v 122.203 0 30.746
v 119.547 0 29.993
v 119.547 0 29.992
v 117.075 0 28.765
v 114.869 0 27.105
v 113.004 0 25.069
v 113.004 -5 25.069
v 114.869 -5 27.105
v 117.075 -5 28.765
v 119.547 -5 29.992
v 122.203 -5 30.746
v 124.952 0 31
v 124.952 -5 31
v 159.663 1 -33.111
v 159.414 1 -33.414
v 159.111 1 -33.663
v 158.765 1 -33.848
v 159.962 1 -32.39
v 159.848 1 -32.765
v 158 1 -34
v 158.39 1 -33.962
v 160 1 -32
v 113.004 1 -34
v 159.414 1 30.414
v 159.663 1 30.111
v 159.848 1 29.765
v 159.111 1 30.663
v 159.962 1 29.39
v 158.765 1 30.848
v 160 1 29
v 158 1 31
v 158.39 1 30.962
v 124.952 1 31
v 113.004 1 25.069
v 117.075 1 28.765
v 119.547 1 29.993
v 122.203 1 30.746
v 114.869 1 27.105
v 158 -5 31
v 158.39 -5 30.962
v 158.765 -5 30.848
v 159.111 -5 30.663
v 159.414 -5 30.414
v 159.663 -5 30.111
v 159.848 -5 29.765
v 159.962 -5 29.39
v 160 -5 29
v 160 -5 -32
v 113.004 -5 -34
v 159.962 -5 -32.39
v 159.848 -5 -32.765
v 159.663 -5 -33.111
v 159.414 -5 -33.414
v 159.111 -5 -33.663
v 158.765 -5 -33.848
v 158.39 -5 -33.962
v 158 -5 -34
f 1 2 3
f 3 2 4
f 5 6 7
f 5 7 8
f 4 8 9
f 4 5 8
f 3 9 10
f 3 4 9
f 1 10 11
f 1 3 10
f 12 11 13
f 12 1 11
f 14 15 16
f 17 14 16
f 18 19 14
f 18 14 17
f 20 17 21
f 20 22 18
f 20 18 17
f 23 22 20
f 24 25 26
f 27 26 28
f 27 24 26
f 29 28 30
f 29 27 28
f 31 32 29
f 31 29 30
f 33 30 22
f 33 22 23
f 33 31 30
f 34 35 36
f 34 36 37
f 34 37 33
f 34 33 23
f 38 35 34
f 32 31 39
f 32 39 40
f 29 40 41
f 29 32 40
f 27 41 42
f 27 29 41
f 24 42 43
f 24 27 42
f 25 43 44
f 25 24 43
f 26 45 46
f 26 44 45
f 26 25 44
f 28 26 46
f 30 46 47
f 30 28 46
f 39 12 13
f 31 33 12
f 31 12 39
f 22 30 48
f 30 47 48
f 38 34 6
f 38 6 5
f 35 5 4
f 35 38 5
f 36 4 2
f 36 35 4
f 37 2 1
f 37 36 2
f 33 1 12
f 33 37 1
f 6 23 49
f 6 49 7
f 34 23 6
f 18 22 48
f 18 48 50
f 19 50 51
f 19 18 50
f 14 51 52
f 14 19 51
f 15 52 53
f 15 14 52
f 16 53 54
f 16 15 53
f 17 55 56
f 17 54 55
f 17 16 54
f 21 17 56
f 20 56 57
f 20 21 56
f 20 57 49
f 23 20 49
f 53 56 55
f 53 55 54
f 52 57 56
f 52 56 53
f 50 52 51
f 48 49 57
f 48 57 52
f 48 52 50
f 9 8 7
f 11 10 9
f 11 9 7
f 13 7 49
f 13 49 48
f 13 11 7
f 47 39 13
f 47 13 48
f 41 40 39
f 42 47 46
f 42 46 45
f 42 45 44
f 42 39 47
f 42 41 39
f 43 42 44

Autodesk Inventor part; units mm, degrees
ref_plane "YZ Plane" through (0, 0, 0) normal (1, 0, 0) x (0, 1, 0)
ref_plane "XZ Plane" through (0, 0, 0) normal (0, 1, 0) x (-1, 0, 0)
ref_plane "XY Plane" through (0, 0, 0) normal (0, 0, 1) x (1, 0, 0)
sketch "Esboço1" plane through (0, 0, 0) normal (0, 1, 0) x (-1, 0, 0)
  line L0 (0, 0) -> (-160, 0)
  line L1 (-160, 0) -> (-160, -34)
  line L2 (-160, -34) -> (0, -34)
  line L3 (0, -34) -> (0, 0)
  line L4 (0, 0) -> (-4, 0)
  line L5 (-4, 0) -> (-62.5, 0)
  line L6 (-160, -34) -> (-160, 31)
  line L7 (-160, -34) -> (-117, -34)
  line L8 (-117, -34) -> (-117, 31)
  line L9 (-117, 31) -> (-160, 31)
  line L10 (-160, 31) -> (-160, -34)
  arc A0 (-117, 31) -> (-62.5, 0) centre (-62.5, 63.4073) ccw
  dimension "d0" = 160
  dimension "d1" = 34
  dimension "d2" = 4
  dimension "d3" = 58.5
  dimension "d4" = 65
  dimension "d5" = 43
extrude "Extrusão1" add sketch "Esboço1" along normal blind 1
fillet "Arredondamento1" radius 2 4 edges at (160, 0.5, 31) (160, 0.5, -34) (0, 0.5, 0) (0, 0.5, -34)
fillet "Arredondamento2" radius 15 1 edges at (117, 0.5, 31)
sketch "Esboço5" plane through (0, 1, 0) normal (0, 1, 0) x (1, 0, 0)
  line L0 (160, -29) -> (160, 32) projected
  line L1 (160, -21.1735) -> (160, -7.1735)
  line L2 (160, -21.1735) -> (146, -21.1735)
  line L3 (124.952, -31) -> (158, -31) projected
  line L4 (146, -31) -> (139, -31)
  line L5 (146, -31) -> (146, -24)
  circle A0 centre (146, -24) radius 3.5
  line L6 (146, -24) -> (130, -24)
  circle A1 centre (130, -24) radius 3.5
  line L7 (146, -24) -> (146, 8)
  circle A2 centre (146, 8) radius 3.5
  line L8 (146, 8) -> (130, 8)
  circle A3 centre (130, 8) radius 3.5
  point P0 (0, 0)
  dimension "d32" = 14
  dimension "d33" = 14
  dimension "d34" = 7
  dimension "d35" = 7
  dimension "d36" = 7
  dimension "d37" = 16
  dimension "d38" = 7
  dimension "d39" = 32
  dimension "d40" = 7
  dimension "d41" = 7
extrude "Extrusão3" add sketch "Esboço5" along normal blind 1
sketch "Esboço6" plane through (130, 2, -8) normal (0, 1, 0) x (1, 0, 0)
  circle A0 centre (0, 0) radius 2.25
  circle A1 centre (16, 0) radius 3.5 projected
  circle A2 centre (16, 0) radius 2.25
  circle A3 centre (0, -32) radius 3.5 projected
  circle A4 centre (0, -32) radius 2.25
  circle A5 centre (16, -32) radius 3.5 projected
  circle A6 centre (16, -32) radius 2.25
  point P0 (-130, -8)
  dimension "d44" = 4.5
  dimension "d45" = 4.5
  dimension "d46" = 4.5
  dimension "d47" = 4.5
extrude "Extrusão4" add sketch "Esboço6" along normal blind 2.5 contours A0 | A2 | A4 | A6
sketch "Esboço7" plane through (130, 4.5, -8) normal (0, 1, 0) x (1, 0, 0)
  circle A0 centre (0, 0) radius 2.25 projected
  line L0 (-0.7066, -1.2286) -> (-1.4173, -0.0023)
  line L1 (-1.4173, -0.0023) -> (-0.7107, 1.2262)
  line L2 (-0.7107, 1.2262) -> (0.7066, 1.2286)
  line L3 (0.7066, 1.2286) -> (1.4173, 0.0023)
  line L4 (1.4173, 0.0023) -> (0.7107, -1.2262)
  line L5 (0.7107, -1.2262) -> (-0.7066, -1.2286)
  line L6 (0, 0) -> (8, 0)
  line L7 (8, 0) -> (8, -3.5397)
  circle A1 centre (16, 0) radius 2.25
  line L8 (16.7066, -1.2286) -> (17.4173, -0.0023)
  line L9 (17.4173, -0.0023) -> (16.7107, 1.2262)
  line L10 (16.7107, 1.2262) -> (15.2934, 1.2286)
  line L11 (15.2934, 1.2286) -> (14.5827, 0.0023)
  line L12 (14.5827, 0.0023) -> (15.2893, -1.2262)
  line L13 (15.2893, -1.2262) -> (16.7066, -1.2286)
  line L14 (0, 0) -> (0, -16)
  line L15 (0, -16) -> (6.7888, -16)
  circle A2 centre (0, -32) radius 2.25
  line L16 (-0.7066, -30.7714) -> (-1.4173, -31.9977)
  line L17 (-1.4173, -31.9977) -> (-0.7107, -33.2262)
  line L18 (-0.7107, -33.2262) -> (0.7066, -33.2286)
  line L19 (0.7066, -33.2286) -> (1.4173, -32.0023)
  line L20 (1.4173, -32.0023) -> (0.7107, -30.7738)
  line L21 (0.7107, -30.7738) -> (-0.7066, -30.7714)
  circle A3 centre (16, -32) radius 2.25
  line L22 (16.7066, -30.7714) -> (17.4173, -31.9977)
  line L23 (17.4173, -31.9977) -> (16.7107, -33.2262)
  line L24 (16.7107, -33.2262) -> (15.2934, -33.2286)
  line L25 (15.2934, -33.2286) -> (14.5827, -32.0023)
  line L26 (14.5827, -32.0023) -> (15.2893, -30.7738)
  line L27 (15.2893, -30.7738) -> (16.7066, -30.7714)
  point P0 (-130, -8)
  dimension "d50" = 8
  dimension "d51" = 16
extrude "Extrusão5" cut sketch "Esboço7" against normal blind 1.5 contours L6 L14 L5 L0 L1 L2 L3 L4 | L4 L5 L14 L6 | L13 L12 L11 L10 L9 L8 | L21 L20 L19 L18 L17 L16 | L22 L23 L24 L25 L26 L27
sketch "Esboço8" plane through (0, 1, 0) normal (0, 1, 0) x (1, 0, 0)
  line L0 (0, 0) -> (6, 0)
  line L1 (2, 0) -> (62.5, 0) projected
  line L2 (6, 0) -> (-1.5, 0)
  line L3 (6, 0) -> (6, 7.5)
  circle A0 centre (6, 7.5) radius 2.25
  line L4 (0, 32) -> (0, 2) projected
  line L5 (0, 17) -> (13.7618, 17)
  circle A1 centre (6, 26.5) radius 2.25
  dimension "d54" = 6
  dimension "d55" = 7.5
  dimension "d56" = 7.5
  dimension "d57" = 4.5
extrude "Extrusão6" cut sketch "Esboço8" against normal blind 0.1
sketch "Esboço9" plane through (6, 0.9, -26.5) normal (0, 1, 0) x (1, 0, 0)
  circle A0 centre (0, -19) radius 2.25 projected
  line L0 (0, -19) -> (0.25, -19)
  line L1 (0.25, -19) -> (0.25, -20.5)
  line L2 (0.25, -20.5) -> (0, -20.5)
  line L3 (0, -20.5) -> (0, -19)
  line L4 (0, -20.5) -> (-0.25, -20.5)
  line L5 (-0.25, -20.5) -> (-0.25, -19)
  line L6 (-0.25, -19) -> (0, -19)
  line L7 (0, -19) -> (0, -20.5)
  line L8 (0.25, -20.5) -> (-0.25, -20.5)
  line L9 (-0.25, -20.5) -> (-0.25, -17.5)
  line L10 (-0.25, -17.5) -> (0.25, -17.5)
  line L11 (0.25, -17.5) -> (0.25, -20.5)
  line L12 (0, -19) -> (1.5, -19)
  line L13 (1.5, -19) -> (1.5, -18.75)
  line L14 (1.5, -18.75) -> (0, -18.75)
  line L15 (0, -18.75) -> (0, -19)
  line L16 (1.5, -18.75) -> (-1.5, -18.75)
  line L17 (-1.5, -18.75) -> (-1.5, -19.25)
  line L18 (-1.5, -19.25) -> (1.5, -19.25)
  line L19 (1.5, -19.25) -> (1.5, -18.75)
  line L20 (-6, 5.5) -> (-6, -24.5) projected
  line L21 (-6, -9.5) -> (4.7143, -9.5)
  line L22 (0, 0) -> (0.25, 0)
  line L23 (0.25, 0) -> (0.25, 1.5)
  line L24 (0.25, 1.5) -> (0, 1.5)
  line L25 (0, 1.5) -> (0, 0)
  line L26 (0, 1.5) -> (-0.25, 1.5)
  line L27 (-0.25, 1.5) -> (-0.25, 0)
  line L28 (-0.25, 0) -> (0, 0)
  line L29 (0, 0) -> (0, 1.5)
  line L30 (0.25, 1.5) -> (-0.25, 1.5)
  line L31 (-0.25, 1.5) -> (-0.25, -1.5)
  line L32 (-0.25, -1.5) -> (0.25, -1.5)
  line L33 (0.25, -1.5) -> (0.25, 1.5)
  line L34 (0, 0) -> (1.5, 0)
  line L35 (1.5, 0) -> (1.5, -0.25)
  line L36 (1.5, -0.25) -> (0, -0.25)
  line L37 (0, -0.25) -> (0, 0)
  line L38 (1.5, -0.25) -> (-1.5, -0.25)
  line L39 (-1.5, -0.25) -> (-1.5, 0.25)
  line L40 (-1.5, 0.25) -> (1.5, 0.25)
  line L41 (1.5, 0.25) -> (1.5, -0.25)
  point P0 (-6, -26.5)
  point P1 (-0.25, -19.25)
  point P2 (0.25, -19.25)
  point P3 (0.25, -18.75)
  point P4 (-0.25, -18.75)
  point P5 (0.25, 0.25)
  point P6 (-0.25, 0.25)
  point P7 (-0.25, -0.25)
  point P8 (0.25, -0.25)
  dimension "d60" = 0.25
  dimension "d61" = 1.5
  dimension "d62" = 0.25
  dimension "d63" = 3
  dimension "d64" = 1.5
  dimension "d65" = 0.25
  dimension "d66" = 3
  dimension "d67" = 0.5
extrude "Extrusão7" cut sketch "Esboço9" against normal blind 0.1 contours L15 L14 L11 L0 | L0 L1 L18 L3 | L3 L18 L5 L6 | L6 L9 L16 L15 | L12 L19 L18 L1 | L11 L14 L13 L12 | L18 L1 L2 L3 | L3 L4 L5 L18 | L5 L18 L17 L16 L9 | L16 L9 L10 L11 L14 | L25 L40 L23 L22 | L28 L27 L40 L25 | L37 L38 L31 L28 | L22 L33 L36 L37 | L34 L35 L36 L33 | L23 L40 L41 L34 | L40 L27 L26 L25 | L25 L24 L23 L40 | L31 L38 L39 L40 L27 | L36 L33 L32 L31 L38
sketch "Esboço10" plane through (6, 0.9, -26.5) normal (0, 1, 0) x (1, 0, 0)
  line L0 (0, 0) -> (52, 0)
  circle A0 centre (52, 0) radius 2.25
  circle A1 centre (0, -19) radius 2.25 projected
  line L1 (0, -19) -> (52, -19)
  circle A2 centre (52, -19) radius 2.25
  point P0 (-6, -26.5)
  dimension "d70" = 52
  dimension "d71" = 4.5
  dimension "d72" = 52
  dimension "d73" = 4.5
extrude "Extrusão8" cut sketch "Esboço10" along normal blind 2 contours A0 | A2
sketch "Esboço11" plane through (58, 0.9, -26.5) normal (0, 1, 0) x (1, 0, 0)
  line L0 (0, 0) -> (0.25, 0)
  line L1 (0.25, 0) -> (0.25, 1.5)
  line L2 (0.25, 1.5) -> (0, 1.5)
  line L3 (0, 1.5) -> (0, 0)
  line L4 (0.25, 1.5) -> (-0.25, 1.5)
  line L5 (-0.25, 1.5) -> (-0.25, -1.5)
  line L6 (-0.25, -1.5) -> (0.25, -1.5)
  line L7 (0.25, -1.5) -> (0.25, 1.5)
  line L8 (0, 0) -> (1.5, 0)
  line L9 (1.5, 0) -> (1.5, 0.25)
  line L10 (1.5, 0.25) -> (0, 0.25)
  line L11 (0, 0.25) -> (0, 0)
  line L12 (1.5, 0.25) -> (-1.5, 0.25)
  line L13 (-1.5, 0.25) -> (-1.5, -0.25)
  line L14 (-1.5, -0.25) -> (1.5, -0.25)
  line L15 (1.5, -0.25) -> (1.5, 0.25)
  line L16 (-58, 5.5) -> (-58, -24.5) projected
  line L17 (-58, -9.5) -> (-46.2393, -9.5)
  line L18 (0, -19) -> (0.25, -19)
  line L19 (0.25, -19) -> (0.25, -20.5)
  line L20 (0.25, -20.5) -> (0, -20.5)
  line L21 (0, -20.5) -> (0, -19)
  line L22 (0.25, -20.5) -> (-0.25, -20.5)
  line L23 (-0.25, -20.5) -> (-0.25, -17.5)
  line L24 (-0.25, -17.5) -> (0.25, -17.5)
  line L25 (0.25, -17.5) -> (0.25, -20.5)
  line L26 (0, -19) -> (1.5, -19)
  line L27 (1.5, -19) -> (1.5, -19.25)
  line L28 (1.5, -19.25) -> (0, -19.25)
  line L29 (0, -19.25) -> (0, -19)
  line L30 (1.5, -19.25) -> (-1.5, -19.25)
  line L31 (-1.5, -19.25) -> (-1.5, -18.75)
  line L32 (-1.5, -18.75) -> (1.5, -18.75)
  line L33 (1.5, -18.75) -> (1.5, -19.25)
  point P0 (-58, -26.5)
  point P1 (0.25, -0.25)
  point P2 (1.5, 0)
  point P3 (0.25, 0.25)
  point P4 (0, 1.5)
  point P5 (-0.25, 0.25)
  point P6 (-0.25, -0.25)
  point P7 (0.25, -19.25)
  point P8 (1.5, -19)
  point P9 (0.25, -18.75)
  point P10 (-0.25, -18.75)
  point P11 (-0.25, -19.25)
  dimension "d76" = 0.25
  dimension "d77" = 1.5
  dimension "d78" = 0.5
  dimension "d79" = 3
  dimension "d80" = 1.5
  dimension "d81" = 0.25
  dimension "d82" = 3
  dimension "d83" = 0.5
extrude "Extrusão9" cut sketch "Esboço11" against normal blind 0.1
sketch "Esboço12" plane through (0, 0, 0) normal (0, -1, 0) x (1, 0, 0)
  arc A0 (124.952, 31) -> (113.0044, 25.0694) centre (124.952, 16) ccw projected
  line L0 (160, -34) -> (124.952, -34)
  line L1 (124.952, -34) -> (124.952, 31)
  line L2 (124.952, 31) -> (160, 31)
  line L3 (160, 31) -> (160, -34)
  line L4 (113.0044, 25.0694) -> (124.952, 25.0694)
  line L5 (124.952, 25.0694) -> (124.952, -34)
  line L6 (124.952, -34) -> (113.0044, -34)
  line L7 (113.0044, -34) -> (113.0044, 25.0694)
  arc A1 (124.952, 31) -> (113.0044, 25.0694) centre (124.952, 16) ccw
  point P0 (0, 0)
extrude "Extrusão10" add sketch "Esboço12" along normal blind 5
sketch "Esboço13" plane through (0, 1, 0) normal (0, 1, 0) x (1, 0, 0)
  point P0 (0, 0)
sketch "Esboço14" plane through (0, -5, 0) normal (0, -1, 0) x (1, 0, 0)
  arc A0 (160, 29) -> (158, 31) centre (158, 29) ccw projected
  circle A1 centre (158, 29) radius 2
  arc A2 (158, -34) -> (160, -32) centre (158, -32) ccw projected
  circle A3 centre (158, -32) radius 2
  line L0 (160, 31) -> (124.952, 31) projected
  line L1 (158, 29) -> (160, 29)
  line L2 (160, 29) -> (160, 31)
  line L3 (160, 31) -> (158, 31)
  line L4 (158, 31) -> (158, 29)
  line L5 (158, -32) -> (160, -32)
  line L6 (160, -32) -> (160, -34)
  line L7 (160, -34) -> (158, -34)
  line L8 (158, -34) -> (158, -32)
  point P0 (0, 0)
extrude "Extrusão11" cut sketch "Esboço14" against normal blind 20 contours A0 L0 L2 | A2 L6 L7
sketch "Esboço15" plane through (158, 1, -34) normal (0, 0, -1) x (-1, 0, 0)
  line L0 (44.9956, -1) -> (95.5, -1) projected
  line L1 (44.9956, -1) -> (158, -1)
  line L2 (158, -1) -> (158, 2.7863)
  line L3 (158, 2.7863) -> (44.9956, 2.7863)
  line L4 (44.9956, 2.7863) -> (44.9956, -1)
  line L5 (-2, 0) -> (0, 0) projected
  line L6 (-2, 0) -> (44.9956, 0)
  line L7 (44.9956, 0) -> (44.9956, 5.0916)
  line L8 (44.9956, 5.0916) -> (-2, 5.0916)
  line L9 (-2, 5.0916) -> (-2, 0)
  point P0 (44.9956, 0)
extrude "Extrusão12" cut sketch "Esboço15" against normal blind 66
properties part number "Calco"
